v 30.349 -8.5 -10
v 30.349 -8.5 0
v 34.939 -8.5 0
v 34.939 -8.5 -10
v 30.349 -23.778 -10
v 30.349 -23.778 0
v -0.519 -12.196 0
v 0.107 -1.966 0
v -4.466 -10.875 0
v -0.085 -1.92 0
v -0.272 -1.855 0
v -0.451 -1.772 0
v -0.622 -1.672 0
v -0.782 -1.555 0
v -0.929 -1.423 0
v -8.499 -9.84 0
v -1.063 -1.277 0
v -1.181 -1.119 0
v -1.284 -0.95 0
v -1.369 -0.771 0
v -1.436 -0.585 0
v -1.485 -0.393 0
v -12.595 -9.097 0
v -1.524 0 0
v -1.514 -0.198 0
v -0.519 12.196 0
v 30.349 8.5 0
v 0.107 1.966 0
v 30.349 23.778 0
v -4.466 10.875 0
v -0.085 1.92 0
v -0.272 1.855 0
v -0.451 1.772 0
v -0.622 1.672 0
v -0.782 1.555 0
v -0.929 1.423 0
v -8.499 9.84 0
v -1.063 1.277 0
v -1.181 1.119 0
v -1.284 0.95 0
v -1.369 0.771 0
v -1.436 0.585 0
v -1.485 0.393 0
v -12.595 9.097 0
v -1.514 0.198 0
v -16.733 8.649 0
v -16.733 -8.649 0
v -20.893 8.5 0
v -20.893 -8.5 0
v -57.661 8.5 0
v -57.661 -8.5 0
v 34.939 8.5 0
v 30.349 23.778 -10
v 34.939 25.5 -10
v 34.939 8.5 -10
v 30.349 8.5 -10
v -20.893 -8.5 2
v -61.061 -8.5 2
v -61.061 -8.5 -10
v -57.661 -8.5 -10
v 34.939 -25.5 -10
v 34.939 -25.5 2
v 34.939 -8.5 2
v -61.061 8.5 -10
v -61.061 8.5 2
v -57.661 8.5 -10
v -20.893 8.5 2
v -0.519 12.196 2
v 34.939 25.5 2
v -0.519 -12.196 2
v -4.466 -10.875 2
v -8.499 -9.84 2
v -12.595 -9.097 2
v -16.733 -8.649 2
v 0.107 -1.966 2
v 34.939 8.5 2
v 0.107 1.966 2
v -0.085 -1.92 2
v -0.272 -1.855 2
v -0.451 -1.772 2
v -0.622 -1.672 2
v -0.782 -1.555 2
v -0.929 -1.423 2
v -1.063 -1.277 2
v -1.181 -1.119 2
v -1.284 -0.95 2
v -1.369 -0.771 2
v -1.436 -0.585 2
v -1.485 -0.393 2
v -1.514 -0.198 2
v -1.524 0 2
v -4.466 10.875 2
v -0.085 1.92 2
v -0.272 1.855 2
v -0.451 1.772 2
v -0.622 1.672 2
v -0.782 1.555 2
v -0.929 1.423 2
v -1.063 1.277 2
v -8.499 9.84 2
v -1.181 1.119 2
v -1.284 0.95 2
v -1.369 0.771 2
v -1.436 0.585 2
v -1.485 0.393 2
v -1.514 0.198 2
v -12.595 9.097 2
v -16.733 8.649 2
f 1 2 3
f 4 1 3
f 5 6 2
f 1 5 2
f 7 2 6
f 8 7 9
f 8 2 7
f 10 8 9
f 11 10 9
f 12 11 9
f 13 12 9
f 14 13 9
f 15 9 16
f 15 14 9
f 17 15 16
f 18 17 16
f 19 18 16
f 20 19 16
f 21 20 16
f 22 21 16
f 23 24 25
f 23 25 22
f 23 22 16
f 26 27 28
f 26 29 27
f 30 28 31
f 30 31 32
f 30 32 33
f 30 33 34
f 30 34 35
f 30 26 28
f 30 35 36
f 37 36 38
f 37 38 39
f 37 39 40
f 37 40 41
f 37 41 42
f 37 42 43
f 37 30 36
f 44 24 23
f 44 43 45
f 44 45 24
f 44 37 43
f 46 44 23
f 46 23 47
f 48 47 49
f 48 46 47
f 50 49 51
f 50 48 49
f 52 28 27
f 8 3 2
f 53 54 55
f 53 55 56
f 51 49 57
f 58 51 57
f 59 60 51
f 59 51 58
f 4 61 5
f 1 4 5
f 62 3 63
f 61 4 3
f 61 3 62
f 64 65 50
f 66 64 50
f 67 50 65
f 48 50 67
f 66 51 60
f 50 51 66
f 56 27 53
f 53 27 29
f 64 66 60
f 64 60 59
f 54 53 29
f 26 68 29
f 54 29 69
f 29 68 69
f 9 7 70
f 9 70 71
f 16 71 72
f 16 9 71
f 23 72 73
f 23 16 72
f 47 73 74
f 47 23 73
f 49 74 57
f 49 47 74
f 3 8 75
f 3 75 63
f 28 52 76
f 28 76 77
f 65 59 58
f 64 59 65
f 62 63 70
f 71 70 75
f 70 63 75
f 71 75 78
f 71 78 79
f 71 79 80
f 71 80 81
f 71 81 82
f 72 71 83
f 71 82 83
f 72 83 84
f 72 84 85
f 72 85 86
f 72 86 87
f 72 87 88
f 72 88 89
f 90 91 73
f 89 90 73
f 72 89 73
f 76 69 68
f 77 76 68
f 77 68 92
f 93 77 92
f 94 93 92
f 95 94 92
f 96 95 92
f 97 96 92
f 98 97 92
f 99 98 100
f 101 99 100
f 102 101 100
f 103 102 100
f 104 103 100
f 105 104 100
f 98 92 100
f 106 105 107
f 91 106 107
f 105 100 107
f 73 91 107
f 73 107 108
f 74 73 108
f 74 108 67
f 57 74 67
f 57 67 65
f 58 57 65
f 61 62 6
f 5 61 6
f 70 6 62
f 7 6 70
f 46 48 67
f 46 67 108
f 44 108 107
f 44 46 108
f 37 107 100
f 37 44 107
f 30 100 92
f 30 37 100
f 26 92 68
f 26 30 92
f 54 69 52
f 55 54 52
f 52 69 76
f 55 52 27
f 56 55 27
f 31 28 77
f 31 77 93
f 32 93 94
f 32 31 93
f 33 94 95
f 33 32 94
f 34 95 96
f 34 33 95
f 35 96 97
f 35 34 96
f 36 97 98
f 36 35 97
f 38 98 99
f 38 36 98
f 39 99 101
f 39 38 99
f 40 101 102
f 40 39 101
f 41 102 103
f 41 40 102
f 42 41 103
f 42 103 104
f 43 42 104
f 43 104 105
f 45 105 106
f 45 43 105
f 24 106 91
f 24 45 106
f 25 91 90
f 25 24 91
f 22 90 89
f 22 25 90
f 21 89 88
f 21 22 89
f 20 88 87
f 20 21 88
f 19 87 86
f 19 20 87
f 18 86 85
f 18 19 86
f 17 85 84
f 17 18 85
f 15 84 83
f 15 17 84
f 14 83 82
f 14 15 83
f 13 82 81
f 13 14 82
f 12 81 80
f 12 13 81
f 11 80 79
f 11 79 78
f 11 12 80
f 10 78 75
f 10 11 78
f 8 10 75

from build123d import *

# Parameters (mm, degrees)
EXTRUDE_1_DEPTH = 2
SKETCH_3_W      = 3.4
SKETCH_3_H      = 17
EXTRUDE_2_DEPTH = 10


with BuildPart() as part:
    # 스케치1 → 보스-돌출1 (new body)
    with BuildSketch(Plane.XY):
        with BuildLine():
            Line((-0.518908087, 12.196403379), (34.938840058, 25.5))
            Line((34.938840058, 25.5), (34.938840058, 8.5))
            Line((34.938840058, 8.5), (0.107473336, 1.965709515))
            ThreePointArc((0.107473336, 1.965709515), (-1.52376373, 0), (0.107473336, -1.965709515))
            Line((0.107473336, -1.965709515), (34.938840058, -8.5))
            Line((34.938840058, -8.5), (34.938840058, -25.5))
            Line((34.938840058, -25.5), (-0.518908087, -12.196403379))
            ThreePointArc((-0.518908087, -12.196403379), (-10.539851544, -9.431582272), (-20.893387075, -8.5))
            Line((-20.893387075, -8.5), (-61.061159942, -8.5))
            Line((-61.061159942, -8.5), (-61.061159942, 8.5))
            Line((-61.061159942, 8.5), (-20.893387075, 8.5))
            ThreePointArc((-20.893387075, 8.5), (-10.539851544, 9.431582272), (-0.518908087, 12.196403379))
        make_face()
    extrude(amount=EXTRUDE_1_DEPTH)

    # 스케치3 → 보스-돌출2 (add)
    with BuildSketch(Plane(origin=(0, 0, 0), x_dir=(-1, 0, 0), z_dir=(0, 0, -1))):
        Polygon((-34.938840058, 25.5), (-34.938840058, 8.5), (-30.348840058, 8.5), (-30.348840058, 23.77785148), align=None)
        Polygon((-34.938840058, -8.5), (-34.938840058, -25.5), (-30.348840058, -23.77785148), (-30.348840058, -8.5), align=None)
        with Locations((59.361159942, 0)):
            Rectangle(SKETCH_3_W, SKETCH_3_H)
    extrude(amount=EXTRUDE_2_DEPTH)


solid = part.part
